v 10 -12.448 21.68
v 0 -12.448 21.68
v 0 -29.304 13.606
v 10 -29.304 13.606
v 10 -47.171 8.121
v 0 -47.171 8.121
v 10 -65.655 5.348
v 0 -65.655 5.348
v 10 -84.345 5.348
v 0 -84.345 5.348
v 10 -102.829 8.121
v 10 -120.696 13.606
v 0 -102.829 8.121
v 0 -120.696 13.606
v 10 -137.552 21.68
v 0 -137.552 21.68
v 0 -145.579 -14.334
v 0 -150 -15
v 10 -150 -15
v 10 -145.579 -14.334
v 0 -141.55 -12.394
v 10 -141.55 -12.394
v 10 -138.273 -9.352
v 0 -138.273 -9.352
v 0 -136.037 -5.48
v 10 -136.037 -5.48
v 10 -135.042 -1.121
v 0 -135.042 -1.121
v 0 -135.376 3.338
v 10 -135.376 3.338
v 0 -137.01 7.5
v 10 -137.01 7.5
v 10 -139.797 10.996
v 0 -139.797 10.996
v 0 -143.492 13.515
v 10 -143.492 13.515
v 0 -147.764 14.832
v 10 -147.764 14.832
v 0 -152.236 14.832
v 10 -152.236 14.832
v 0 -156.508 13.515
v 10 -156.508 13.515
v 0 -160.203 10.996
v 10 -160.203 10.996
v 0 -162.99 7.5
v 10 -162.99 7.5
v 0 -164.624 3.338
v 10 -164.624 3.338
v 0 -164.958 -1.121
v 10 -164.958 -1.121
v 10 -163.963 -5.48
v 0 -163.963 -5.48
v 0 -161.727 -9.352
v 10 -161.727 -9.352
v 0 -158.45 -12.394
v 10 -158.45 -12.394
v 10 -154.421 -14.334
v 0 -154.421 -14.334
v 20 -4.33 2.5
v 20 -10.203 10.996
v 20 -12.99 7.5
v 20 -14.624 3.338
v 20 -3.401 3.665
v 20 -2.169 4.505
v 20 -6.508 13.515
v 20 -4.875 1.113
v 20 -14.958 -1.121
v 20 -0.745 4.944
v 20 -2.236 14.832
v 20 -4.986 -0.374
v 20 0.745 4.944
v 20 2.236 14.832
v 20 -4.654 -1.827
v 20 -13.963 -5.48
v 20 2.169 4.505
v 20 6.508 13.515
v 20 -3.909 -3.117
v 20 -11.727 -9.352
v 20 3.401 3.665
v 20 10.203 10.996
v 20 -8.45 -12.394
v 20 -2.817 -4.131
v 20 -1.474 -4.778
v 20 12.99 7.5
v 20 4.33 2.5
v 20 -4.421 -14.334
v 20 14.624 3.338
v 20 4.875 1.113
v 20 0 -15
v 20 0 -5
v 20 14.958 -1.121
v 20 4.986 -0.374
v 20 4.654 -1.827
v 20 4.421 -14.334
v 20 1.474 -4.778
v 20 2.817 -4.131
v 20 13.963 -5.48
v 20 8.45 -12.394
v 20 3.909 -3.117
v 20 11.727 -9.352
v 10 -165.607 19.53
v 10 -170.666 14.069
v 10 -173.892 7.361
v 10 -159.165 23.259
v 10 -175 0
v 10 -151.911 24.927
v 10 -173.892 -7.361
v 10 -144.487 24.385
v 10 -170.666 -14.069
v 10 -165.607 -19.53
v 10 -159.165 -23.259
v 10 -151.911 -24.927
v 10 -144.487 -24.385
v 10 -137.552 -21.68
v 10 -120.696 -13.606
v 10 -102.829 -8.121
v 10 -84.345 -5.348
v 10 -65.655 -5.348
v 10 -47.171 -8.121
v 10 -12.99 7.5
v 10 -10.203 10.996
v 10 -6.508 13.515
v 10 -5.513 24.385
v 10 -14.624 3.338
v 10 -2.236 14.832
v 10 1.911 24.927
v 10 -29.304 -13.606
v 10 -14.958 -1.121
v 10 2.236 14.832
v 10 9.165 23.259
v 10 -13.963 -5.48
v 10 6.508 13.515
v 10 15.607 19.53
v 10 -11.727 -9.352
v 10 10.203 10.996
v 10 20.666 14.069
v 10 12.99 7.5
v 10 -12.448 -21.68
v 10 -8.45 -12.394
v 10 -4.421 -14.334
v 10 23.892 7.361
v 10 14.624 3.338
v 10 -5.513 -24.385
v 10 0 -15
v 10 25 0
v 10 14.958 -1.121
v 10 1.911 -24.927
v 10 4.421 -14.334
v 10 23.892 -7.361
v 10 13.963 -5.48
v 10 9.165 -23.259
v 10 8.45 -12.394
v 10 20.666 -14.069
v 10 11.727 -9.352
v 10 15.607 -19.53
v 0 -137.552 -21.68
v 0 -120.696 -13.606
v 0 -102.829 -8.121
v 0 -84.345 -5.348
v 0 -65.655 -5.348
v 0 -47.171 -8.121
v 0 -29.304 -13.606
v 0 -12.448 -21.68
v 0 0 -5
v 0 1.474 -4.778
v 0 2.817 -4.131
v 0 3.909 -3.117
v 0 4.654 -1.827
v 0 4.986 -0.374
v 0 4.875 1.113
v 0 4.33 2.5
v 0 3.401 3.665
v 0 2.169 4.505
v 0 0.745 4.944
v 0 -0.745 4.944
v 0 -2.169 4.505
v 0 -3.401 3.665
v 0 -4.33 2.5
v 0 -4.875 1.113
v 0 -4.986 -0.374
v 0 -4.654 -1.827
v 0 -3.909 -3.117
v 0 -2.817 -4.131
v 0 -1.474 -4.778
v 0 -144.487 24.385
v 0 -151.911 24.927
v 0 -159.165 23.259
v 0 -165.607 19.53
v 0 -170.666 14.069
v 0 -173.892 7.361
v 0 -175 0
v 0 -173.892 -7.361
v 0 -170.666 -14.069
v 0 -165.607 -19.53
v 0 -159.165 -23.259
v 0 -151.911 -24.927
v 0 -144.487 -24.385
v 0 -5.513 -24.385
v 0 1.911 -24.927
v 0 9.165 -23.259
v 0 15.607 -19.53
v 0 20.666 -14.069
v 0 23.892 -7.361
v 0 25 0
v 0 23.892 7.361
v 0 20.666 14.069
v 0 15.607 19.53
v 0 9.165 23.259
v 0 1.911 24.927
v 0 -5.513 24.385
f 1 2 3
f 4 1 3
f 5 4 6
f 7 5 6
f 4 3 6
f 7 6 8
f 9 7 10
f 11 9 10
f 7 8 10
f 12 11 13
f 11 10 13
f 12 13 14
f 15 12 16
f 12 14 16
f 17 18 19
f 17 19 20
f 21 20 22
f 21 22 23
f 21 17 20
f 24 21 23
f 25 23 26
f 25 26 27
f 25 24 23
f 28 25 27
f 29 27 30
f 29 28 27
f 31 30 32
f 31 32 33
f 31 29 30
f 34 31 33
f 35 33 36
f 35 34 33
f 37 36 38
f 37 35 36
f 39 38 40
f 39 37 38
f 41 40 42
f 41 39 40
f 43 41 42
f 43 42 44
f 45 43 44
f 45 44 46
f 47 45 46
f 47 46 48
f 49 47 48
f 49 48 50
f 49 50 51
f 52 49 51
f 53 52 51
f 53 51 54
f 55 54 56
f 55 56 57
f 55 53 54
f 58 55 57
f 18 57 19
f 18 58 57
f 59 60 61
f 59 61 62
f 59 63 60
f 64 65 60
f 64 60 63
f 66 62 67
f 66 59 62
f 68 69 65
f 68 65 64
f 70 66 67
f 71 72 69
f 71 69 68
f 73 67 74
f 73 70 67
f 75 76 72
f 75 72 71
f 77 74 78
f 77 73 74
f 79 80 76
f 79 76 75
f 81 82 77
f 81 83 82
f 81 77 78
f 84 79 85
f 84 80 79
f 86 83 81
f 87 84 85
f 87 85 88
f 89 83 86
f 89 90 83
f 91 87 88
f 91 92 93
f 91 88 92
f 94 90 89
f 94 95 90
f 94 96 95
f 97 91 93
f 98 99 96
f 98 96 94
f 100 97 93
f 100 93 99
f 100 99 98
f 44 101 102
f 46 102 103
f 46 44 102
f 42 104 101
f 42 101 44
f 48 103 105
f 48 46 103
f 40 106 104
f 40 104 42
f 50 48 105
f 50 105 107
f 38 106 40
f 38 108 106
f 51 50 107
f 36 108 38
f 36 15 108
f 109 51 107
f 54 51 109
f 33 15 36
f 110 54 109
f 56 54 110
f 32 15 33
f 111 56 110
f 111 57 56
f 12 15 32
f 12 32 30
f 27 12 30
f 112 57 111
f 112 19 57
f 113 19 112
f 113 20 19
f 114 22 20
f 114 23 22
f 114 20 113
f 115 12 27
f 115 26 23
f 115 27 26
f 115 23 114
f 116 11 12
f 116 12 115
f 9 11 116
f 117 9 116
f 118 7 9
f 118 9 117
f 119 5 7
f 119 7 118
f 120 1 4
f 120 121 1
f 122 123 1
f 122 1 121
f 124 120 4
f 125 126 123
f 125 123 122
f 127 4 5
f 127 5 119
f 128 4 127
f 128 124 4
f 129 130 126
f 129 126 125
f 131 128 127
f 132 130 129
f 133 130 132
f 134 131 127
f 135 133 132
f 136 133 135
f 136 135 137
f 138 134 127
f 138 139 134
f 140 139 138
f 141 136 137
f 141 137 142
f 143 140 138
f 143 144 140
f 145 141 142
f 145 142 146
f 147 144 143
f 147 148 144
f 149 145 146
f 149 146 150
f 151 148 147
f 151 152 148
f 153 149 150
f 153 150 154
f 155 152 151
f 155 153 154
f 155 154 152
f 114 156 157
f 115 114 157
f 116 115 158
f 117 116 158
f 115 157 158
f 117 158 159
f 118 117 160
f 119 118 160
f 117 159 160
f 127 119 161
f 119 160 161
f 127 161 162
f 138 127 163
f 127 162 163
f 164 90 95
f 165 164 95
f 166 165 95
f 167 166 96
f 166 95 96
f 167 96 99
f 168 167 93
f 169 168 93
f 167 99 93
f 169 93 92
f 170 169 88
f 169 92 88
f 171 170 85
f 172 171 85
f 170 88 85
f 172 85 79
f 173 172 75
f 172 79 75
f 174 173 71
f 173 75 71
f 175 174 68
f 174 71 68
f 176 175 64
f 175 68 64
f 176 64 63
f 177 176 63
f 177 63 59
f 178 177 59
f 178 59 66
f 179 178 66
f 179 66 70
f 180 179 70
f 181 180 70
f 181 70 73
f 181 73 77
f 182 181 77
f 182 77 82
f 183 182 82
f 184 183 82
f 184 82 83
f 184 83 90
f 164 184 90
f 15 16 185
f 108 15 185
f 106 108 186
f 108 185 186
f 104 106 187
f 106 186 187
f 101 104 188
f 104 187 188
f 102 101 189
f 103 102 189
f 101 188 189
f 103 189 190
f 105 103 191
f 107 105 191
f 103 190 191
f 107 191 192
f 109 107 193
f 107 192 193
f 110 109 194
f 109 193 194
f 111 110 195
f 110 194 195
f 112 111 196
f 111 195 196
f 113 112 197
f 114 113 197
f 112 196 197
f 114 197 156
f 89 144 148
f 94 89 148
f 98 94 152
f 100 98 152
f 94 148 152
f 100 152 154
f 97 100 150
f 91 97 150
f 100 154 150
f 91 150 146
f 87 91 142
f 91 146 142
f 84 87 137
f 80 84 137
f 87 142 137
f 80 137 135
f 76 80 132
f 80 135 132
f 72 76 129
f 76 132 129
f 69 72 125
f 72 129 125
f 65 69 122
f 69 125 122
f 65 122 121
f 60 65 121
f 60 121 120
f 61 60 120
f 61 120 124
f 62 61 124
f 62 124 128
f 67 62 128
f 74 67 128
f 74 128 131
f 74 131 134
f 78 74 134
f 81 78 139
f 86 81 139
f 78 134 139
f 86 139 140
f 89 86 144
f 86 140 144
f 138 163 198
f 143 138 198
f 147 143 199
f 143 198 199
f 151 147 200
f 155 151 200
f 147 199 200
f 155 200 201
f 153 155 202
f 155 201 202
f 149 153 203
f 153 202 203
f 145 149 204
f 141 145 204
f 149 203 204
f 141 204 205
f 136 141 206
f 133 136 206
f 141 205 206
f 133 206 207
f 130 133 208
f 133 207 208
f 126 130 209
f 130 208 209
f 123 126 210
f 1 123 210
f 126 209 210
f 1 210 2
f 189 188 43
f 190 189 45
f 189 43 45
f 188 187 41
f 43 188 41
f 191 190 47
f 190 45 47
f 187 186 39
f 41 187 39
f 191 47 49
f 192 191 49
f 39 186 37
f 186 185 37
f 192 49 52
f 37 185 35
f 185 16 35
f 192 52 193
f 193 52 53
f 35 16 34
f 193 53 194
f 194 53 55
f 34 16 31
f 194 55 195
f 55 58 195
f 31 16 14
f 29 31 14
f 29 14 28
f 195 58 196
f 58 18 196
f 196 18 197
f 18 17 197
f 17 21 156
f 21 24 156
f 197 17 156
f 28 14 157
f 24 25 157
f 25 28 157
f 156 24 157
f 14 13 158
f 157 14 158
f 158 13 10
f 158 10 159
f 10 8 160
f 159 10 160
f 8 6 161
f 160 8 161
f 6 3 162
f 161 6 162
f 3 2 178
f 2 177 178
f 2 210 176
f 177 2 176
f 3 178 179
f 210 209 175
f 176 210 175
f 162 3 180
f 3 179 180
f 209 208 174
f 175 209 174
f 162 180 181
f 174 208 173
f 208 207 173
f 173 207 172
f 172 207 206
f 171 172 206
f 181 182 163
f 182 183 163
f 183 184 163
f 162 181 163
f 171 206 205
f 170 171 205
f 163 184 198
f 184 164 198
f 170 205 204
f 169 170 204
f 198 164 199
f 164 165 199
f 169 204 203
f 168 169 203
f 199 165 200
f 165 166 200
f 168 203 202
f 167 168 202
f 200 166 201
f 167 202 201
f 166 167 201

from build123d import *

# Parameters (mm, degrees)
SKETCH1_R           = 15
BOSS_EXTRUDE1_DEPTH = 10
SKETCH2_R           = 15
BOSS_EXTRUDE2_DEPTH = 10
SKETCH3_R           = 5
CUT_EXTRUDE1_DEPTH  = 45


with BuildPart() as part:
    # Sketch1 → Boss-Extrude1 (new body)
    with BuildSketch(Plane(origin=(0, 0, 0), x_dir=(0, 0, -1), z_dir=(1, 0, 0))):
        with BuildLine():
            ThreePointArc((21.680497925, -12.44813278), (0, 25), (-21.680497925, -12.44813278))
            ThreePointArc((-21.680497925, -12.44813278), (-5, -75), (-21.680497925, -137.55186722))
            ThreePointArc((-21.680497925, -137.55186722), (0, -175), (21.680497925, -137.55186722))
            ThreePointArc((21.680497925, -137.55186722), (5, -75), (21.680497925, -12.44813278))
        make_face()
        with Locations((0, -150)):
            Circle(SKETCH1_R, mode=Mode.SUBTRACT)
    extrude(amount=BOSS_EXTRUDE1_DEPTH)

    # Sketch2 → Boss-Extrude2 (add)
    with BuildSketch(Plane(origin=(10, 0, 0), x_dir=(0, 0, -1), z_dir=(1, 0, 0))):
        Circle(SKETCH2_R)
    extrude(amount=BOSS_EXTRUDE2_DEPTH)

    # Sketch3 → Cut-Extrude1 (cut)
    with BuildSketch(Plane(origin=(20, 0, 0), x_dir=(0, 0, -1), z_dir=(1, 0, 0))):
        Circle(SKETCH3_R)
    extrude(amount=-CUT_EXTRUDE1_DEPTH, mode=Mode.SUBTRACT)


solid = part.part
